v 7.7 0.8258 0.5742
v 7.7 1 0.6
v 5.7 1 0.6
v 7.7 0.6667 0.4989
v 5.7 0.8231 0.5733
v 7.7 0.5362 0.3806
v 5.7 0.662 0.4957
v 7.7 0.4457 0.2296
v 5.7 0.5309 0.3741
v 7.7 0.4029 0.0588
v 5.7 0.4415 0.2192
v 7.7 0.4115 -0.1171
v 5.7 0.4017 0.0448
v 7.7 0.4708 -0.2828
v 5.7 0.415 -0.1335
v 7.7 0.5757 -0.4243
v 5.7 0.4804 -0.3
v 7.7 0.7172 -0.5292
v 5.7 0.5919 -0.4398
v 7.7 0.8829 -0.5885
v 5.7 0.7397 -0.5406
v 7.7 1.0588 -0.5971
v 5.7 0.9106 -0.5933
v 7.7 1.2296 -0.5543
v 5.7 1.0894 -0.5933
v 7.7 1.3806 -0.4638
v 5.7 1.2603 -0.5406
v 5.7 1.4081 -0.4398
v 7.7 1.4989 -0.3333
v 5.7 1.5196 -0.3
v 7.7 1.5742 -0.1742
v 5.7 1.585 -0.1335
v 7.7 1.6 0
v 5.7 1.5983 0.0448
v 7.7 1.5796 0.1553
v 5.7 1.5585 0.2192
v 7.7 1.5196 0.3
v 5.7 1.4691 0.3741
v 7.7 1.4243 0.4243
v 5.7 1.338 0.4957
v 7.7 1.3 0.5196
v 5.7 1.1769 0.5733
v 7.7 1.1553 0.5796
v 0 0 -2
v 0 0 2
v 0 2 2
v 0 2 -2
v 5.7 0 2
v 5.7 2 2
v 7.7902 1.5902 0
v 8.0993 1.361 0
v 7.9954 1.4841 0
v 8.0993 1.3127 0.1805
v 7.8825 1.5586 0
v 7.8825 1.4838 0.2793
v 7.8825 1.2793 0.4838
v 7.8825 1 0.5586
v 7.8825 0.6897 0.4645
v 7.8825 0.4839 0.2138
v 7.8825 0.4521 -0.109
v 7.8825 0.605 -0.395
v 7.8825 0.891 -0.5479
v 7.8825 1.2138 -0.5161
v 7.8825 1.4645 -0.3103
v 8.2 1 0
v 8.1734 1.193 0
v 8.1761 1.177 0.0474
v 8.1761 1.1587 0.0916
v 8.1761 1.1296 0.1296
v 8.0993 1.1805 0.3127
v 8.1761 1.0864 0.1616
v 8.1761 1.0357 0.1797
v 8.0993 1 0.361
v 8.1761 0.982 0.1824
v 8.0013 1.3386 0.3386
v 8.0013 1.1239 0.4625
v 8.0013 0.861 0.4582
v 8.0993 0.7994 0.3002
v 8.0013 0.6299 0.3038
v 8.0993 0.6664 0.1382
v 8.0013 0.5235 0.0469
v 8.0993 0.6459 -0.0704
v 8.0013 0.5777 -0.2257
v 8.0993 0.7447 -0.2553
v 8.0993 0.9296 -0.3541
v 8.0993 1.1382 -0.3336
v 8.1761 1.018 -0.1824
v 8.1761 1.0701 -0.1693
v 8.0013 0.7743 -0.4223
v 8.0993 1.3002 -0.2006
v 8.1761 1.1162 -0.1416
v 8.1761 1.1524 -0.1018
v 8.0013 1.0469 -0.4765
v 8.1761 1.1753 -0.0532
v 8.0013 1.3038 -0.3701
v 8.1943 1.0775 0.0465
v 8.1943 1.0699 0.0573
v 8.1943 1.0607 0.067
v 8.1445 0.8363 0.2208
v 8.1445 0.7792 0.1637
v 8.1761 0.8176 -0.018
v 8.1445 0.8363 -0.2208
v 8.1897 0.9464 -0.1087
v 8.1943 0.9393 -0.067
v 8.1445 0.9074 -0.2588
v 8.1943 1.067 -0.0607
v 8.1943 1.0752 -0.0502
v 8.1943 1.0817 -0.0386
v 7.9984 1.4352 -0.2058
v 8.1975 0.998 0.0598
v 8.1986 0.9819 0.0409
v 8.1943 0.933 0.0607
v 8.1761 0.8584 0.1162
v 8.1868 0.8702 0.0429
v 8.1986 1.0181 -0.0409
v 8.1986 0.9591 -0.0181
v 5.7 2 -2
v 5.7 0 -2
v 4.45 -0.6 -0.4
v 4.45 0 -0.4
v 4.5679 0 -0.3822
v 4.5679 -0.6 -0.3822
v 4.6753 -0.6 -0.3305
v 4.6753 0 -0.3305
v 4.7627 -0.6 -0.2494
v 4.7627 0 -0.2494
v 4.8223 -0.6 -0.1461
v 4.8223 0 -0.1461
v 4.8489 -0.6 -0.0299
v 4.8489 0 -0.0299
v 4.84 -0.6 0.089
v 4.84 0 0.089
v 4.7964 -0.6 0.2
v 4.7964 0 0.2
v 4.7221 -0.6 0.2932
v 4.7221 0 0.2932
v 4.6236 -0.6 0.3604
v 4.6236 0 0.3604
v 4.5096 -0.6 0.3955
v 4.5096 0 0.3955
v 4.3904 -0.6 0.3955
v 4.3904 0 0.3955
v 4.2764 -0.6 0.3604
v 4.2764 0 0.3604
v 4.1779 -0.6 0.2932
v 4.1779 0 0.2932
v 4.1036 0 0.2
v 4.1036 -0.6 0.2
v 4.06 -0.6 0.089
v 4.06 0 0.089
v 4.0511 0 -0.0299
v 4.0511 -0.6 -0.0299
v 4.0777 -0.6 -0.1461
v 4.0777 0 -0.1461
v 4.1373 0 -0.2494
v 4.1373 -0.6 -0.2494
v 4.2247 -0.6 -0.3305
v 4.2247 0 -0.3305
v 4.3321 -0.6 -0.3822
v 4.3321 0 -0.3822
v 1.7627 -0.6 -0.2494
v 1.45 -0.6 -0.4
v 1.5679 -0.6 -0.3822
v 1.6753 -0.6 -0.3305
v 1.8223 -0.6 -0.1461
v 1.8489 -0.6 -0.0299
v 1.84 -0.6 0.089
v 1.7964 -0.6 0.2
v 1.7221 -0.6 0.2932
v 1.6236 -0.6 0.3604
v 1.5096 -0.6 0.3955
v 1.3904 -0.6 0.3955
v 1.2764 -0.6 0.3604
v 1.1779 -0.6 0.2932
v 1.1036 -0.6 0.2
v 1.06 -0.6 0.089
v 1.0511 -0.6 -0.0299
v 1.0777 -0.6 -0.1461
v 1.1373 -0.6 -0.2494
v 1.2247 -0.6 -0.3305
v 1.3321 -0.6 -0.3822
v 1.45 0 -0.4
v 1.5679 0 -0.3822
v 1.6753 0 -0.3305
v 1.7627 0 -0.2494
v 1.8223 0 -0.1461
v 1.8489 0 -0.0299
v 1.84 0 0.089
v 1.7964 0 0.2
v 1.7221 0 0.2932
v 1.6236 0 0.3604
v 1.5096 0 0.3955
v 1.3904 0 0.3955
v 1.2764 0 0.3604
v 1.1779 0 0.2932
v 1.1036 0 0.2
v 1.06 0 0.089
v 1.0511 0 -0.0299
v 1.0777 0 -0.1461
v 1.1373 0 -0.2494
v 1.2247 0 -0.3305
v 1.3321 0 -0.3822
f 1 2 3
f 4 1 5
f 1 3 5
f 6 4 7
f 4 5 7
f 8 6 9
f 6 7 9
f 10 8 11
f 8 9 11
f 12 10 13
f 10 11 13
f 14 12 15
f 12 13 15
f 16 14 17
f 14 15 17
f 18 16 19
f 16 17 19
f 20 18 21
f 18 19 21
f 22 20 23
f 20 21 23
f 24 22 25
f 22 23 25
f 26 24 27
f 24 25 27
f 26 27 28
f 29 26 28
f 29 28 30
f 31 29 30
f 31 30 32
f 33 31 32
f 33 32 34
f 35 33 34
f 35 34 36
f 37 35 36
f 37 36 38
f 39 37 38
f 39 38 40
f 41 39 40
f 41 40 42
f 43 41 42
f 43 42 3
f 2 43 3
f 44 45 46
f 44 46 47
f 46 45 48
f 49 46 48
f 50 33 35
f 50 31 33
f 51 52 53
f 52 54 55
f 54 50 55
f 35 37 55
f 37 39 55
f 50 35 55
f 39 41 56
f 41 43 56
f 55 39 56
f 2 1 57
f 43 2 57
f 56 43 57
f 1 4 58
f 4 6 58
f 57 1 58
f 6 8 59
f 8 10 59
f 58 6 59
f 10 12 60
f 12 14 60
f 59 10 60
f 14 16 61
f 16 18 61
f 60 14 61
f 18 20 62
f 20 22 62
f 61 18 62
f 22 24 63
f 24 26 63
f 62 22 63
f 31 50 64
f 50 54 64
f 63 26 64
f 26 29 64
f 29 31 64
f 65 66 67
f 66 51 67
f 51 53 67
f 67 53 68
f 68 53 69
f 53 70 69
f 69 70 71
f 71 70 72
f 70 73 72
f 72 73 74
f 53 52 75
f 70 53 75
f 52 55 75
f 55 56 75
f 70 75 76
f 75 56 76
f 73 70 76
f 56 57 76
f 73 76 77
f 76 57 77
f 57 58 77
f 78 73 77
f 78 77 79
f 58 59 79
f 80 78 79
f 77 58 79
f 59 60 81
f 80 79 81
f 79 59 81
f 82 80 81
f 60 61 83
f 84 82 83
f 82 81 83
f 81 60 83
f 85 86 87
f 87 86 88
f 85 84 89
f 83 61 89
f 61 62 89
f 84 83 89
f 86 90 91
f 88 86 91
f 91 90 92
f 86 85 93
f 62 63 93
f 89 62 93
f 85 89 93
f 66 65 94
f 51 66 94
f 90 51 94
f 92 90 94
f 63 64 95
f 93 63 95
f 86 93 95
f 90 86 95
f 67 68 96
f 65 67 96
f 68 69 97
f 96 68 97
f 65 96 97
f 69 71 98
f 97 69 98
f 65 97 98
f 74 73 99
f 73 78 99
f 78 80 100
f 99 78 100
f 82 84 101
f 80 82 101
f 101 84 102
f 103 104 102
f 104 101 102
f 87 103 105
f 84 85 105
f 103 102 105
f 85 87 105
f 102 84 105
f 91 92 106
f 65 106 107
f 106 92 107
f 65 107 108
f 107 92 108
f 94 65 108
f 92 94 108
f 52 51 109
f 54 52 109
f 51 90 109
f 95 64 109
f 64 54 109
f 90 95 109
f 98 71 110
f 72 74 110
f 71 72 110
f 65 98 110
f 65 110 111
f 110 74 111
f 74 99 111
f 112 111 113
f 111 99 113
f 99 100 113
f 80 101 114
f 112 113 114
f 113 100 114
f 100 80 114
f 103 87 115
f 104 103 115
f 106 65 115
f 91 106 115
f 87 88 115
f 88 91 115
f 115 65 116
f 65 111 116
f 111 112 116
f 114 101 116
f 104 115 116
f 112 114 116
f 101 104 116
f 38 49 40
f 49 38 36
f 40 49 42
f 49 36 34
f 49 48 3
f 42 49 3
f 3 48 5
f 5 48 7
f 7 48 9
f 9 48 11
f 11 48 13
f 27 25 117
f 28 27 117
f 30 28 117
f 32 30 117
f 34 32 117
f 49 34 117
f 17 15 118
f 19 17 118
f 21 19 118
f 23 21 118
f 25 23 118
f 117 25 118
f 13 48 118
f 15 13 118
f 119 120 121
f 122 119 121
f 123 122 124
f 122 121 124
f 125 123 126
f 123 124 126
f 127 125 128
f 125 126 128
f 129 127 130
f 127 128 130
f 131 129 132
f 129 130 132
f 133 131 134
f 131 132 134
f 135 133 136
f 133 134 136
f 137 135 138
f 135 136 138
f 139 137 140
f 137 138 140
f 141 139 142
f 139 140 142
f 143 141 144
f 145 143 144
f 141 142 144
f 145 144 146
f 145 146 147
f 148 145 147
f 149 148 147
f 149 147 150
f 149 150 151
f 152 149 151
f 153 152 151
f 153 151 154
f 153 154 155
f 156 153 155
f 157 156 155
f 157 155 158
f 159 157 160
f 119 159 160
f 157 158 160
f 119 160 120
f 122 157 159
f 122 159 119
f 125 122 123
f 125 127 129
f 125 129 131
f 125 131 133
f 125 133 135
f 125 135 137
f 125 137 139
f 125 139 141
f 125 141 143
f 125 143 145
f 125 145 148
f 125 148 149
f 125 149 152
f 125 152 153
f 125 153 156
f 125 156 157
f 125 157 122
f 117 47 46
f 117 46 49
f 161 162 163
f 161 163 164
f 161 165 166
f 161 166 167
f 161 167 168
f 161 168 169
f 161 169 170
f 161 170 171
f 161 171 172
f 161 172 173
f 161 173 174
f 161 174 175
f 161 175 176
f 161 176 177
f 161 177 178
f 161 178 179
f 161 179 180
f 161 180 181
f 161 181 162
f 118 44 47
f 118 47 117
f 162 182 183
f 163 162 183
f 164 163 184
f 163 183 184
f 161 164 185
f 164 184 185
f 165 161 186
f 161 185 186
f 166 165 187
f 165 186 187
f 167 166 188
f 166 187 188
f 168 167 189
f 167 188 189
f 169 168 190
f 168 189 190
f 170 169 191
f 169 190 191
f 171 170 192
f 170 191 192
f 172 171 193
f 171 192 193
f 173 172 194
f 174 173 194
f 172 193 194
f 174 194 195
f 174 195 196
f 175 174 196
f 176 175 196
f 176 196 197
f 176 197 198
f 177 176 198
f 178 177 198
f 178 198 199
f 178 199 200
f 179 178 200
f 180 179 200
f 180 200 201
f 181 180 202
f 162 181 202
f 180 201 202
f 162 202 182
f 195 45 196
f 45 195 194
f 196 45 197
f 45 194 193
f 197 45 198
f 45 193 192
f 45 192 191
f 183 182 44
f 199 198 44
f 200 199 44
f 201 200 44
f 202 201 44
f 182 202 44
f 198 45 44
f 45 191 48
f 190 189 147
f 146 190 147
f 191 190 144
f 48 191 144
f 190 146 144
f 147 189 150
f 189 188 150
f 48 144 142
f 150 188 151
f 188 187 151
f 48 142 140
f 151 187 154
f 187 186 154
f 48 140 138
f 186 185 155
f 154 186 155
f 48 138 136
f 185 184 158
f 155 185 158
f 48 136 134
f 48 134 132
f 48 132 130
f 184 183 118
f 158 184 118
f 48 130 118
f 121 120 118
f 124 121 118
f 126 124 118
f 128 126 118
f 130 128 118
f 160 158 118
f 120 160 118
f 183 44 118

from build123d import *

# Parameters (mm, degrees)
SKETCH1_W           = 5.7
SKETCH1_H           = 4
BOSS_EXTRUDE1_DEPTH = 2
SKETCH2_R           = 0.6
BOSS_EXTRUDE2_DEPTH = 2
SKETCH3_R           = 0.4
BOSS_EXTRUDE3_DEPTH = 0.6


# Read off the part's stored shape, not the designer's step: Dome1
with BuildPart() as part:
    # Sketch1 → Boss-Extrude1 (new body)
    with BuildSketch(Plane(origin=(0, 0, 0), x_dir=(1, 0, 0), z_dir=(0, 1, 0))):
        with Locations((2.85, 0)):
            Rectangle(SKETCH1_W, SKETCH1_H)
    extrude(amount=BOSS_EXTRUDE1_DEPTH)

    # Sketch2 → Boss-Extrude2 (add)
    with BuildSketch(Plane(origin=(5.7, 0, 0), x_dir=(0, 0, -1), z_dir=(1, 0, 0))):
        with Locations(Location((0, 1, 0), (0, 0, 180))):
            Circle(SKETCH2_R)
    extrude(amount=BOSS_EXTRUDE2_DEPTH)

    # Dome1 outline → Dome1 (revolve)
    with BuildSketch(Plane(origin=(0, 1, 0), x_dir=(0, 1, 0), z_dir=(0, 0, -1))):
        with BuildLine():
            add(Edge.make_bspline(
                [(0, 8.2), (0.6, 8.2), (0.6, 7.7)],
                knots=[4.71238898, 4.71238898, 4.71238898, 6.283185307, 6.283185307, 6.283185307], degree=2, weights=[1, 0.707106781, 1]))
            Line((0, 8.2), (0, 7.7))
            Line((0, 7.7), (0.6, 7.7))
        make_face()
    revolve(axis=Axis((0, 1, 0), (1, 0, 0)))

    # Sketch3 → Boss-Extrude3 (add)
    with BuildSketch(Plane(origin=(0, 0, 0), x_dir=(-1, 0, 0), z_dir=(0, -1, 0))):
        with Locations(Location((-4.45, 0, 0), (0, 0, 90))):
            Circle(SKETCH3_R)
        with Locations(Location((-1.45, 0, 0), (0, 0, 90))):
            Circle(SKETCH3_R)
    extrude(amount=BOSS_EXTRUDE3_DEPTH)


solid = part.part
